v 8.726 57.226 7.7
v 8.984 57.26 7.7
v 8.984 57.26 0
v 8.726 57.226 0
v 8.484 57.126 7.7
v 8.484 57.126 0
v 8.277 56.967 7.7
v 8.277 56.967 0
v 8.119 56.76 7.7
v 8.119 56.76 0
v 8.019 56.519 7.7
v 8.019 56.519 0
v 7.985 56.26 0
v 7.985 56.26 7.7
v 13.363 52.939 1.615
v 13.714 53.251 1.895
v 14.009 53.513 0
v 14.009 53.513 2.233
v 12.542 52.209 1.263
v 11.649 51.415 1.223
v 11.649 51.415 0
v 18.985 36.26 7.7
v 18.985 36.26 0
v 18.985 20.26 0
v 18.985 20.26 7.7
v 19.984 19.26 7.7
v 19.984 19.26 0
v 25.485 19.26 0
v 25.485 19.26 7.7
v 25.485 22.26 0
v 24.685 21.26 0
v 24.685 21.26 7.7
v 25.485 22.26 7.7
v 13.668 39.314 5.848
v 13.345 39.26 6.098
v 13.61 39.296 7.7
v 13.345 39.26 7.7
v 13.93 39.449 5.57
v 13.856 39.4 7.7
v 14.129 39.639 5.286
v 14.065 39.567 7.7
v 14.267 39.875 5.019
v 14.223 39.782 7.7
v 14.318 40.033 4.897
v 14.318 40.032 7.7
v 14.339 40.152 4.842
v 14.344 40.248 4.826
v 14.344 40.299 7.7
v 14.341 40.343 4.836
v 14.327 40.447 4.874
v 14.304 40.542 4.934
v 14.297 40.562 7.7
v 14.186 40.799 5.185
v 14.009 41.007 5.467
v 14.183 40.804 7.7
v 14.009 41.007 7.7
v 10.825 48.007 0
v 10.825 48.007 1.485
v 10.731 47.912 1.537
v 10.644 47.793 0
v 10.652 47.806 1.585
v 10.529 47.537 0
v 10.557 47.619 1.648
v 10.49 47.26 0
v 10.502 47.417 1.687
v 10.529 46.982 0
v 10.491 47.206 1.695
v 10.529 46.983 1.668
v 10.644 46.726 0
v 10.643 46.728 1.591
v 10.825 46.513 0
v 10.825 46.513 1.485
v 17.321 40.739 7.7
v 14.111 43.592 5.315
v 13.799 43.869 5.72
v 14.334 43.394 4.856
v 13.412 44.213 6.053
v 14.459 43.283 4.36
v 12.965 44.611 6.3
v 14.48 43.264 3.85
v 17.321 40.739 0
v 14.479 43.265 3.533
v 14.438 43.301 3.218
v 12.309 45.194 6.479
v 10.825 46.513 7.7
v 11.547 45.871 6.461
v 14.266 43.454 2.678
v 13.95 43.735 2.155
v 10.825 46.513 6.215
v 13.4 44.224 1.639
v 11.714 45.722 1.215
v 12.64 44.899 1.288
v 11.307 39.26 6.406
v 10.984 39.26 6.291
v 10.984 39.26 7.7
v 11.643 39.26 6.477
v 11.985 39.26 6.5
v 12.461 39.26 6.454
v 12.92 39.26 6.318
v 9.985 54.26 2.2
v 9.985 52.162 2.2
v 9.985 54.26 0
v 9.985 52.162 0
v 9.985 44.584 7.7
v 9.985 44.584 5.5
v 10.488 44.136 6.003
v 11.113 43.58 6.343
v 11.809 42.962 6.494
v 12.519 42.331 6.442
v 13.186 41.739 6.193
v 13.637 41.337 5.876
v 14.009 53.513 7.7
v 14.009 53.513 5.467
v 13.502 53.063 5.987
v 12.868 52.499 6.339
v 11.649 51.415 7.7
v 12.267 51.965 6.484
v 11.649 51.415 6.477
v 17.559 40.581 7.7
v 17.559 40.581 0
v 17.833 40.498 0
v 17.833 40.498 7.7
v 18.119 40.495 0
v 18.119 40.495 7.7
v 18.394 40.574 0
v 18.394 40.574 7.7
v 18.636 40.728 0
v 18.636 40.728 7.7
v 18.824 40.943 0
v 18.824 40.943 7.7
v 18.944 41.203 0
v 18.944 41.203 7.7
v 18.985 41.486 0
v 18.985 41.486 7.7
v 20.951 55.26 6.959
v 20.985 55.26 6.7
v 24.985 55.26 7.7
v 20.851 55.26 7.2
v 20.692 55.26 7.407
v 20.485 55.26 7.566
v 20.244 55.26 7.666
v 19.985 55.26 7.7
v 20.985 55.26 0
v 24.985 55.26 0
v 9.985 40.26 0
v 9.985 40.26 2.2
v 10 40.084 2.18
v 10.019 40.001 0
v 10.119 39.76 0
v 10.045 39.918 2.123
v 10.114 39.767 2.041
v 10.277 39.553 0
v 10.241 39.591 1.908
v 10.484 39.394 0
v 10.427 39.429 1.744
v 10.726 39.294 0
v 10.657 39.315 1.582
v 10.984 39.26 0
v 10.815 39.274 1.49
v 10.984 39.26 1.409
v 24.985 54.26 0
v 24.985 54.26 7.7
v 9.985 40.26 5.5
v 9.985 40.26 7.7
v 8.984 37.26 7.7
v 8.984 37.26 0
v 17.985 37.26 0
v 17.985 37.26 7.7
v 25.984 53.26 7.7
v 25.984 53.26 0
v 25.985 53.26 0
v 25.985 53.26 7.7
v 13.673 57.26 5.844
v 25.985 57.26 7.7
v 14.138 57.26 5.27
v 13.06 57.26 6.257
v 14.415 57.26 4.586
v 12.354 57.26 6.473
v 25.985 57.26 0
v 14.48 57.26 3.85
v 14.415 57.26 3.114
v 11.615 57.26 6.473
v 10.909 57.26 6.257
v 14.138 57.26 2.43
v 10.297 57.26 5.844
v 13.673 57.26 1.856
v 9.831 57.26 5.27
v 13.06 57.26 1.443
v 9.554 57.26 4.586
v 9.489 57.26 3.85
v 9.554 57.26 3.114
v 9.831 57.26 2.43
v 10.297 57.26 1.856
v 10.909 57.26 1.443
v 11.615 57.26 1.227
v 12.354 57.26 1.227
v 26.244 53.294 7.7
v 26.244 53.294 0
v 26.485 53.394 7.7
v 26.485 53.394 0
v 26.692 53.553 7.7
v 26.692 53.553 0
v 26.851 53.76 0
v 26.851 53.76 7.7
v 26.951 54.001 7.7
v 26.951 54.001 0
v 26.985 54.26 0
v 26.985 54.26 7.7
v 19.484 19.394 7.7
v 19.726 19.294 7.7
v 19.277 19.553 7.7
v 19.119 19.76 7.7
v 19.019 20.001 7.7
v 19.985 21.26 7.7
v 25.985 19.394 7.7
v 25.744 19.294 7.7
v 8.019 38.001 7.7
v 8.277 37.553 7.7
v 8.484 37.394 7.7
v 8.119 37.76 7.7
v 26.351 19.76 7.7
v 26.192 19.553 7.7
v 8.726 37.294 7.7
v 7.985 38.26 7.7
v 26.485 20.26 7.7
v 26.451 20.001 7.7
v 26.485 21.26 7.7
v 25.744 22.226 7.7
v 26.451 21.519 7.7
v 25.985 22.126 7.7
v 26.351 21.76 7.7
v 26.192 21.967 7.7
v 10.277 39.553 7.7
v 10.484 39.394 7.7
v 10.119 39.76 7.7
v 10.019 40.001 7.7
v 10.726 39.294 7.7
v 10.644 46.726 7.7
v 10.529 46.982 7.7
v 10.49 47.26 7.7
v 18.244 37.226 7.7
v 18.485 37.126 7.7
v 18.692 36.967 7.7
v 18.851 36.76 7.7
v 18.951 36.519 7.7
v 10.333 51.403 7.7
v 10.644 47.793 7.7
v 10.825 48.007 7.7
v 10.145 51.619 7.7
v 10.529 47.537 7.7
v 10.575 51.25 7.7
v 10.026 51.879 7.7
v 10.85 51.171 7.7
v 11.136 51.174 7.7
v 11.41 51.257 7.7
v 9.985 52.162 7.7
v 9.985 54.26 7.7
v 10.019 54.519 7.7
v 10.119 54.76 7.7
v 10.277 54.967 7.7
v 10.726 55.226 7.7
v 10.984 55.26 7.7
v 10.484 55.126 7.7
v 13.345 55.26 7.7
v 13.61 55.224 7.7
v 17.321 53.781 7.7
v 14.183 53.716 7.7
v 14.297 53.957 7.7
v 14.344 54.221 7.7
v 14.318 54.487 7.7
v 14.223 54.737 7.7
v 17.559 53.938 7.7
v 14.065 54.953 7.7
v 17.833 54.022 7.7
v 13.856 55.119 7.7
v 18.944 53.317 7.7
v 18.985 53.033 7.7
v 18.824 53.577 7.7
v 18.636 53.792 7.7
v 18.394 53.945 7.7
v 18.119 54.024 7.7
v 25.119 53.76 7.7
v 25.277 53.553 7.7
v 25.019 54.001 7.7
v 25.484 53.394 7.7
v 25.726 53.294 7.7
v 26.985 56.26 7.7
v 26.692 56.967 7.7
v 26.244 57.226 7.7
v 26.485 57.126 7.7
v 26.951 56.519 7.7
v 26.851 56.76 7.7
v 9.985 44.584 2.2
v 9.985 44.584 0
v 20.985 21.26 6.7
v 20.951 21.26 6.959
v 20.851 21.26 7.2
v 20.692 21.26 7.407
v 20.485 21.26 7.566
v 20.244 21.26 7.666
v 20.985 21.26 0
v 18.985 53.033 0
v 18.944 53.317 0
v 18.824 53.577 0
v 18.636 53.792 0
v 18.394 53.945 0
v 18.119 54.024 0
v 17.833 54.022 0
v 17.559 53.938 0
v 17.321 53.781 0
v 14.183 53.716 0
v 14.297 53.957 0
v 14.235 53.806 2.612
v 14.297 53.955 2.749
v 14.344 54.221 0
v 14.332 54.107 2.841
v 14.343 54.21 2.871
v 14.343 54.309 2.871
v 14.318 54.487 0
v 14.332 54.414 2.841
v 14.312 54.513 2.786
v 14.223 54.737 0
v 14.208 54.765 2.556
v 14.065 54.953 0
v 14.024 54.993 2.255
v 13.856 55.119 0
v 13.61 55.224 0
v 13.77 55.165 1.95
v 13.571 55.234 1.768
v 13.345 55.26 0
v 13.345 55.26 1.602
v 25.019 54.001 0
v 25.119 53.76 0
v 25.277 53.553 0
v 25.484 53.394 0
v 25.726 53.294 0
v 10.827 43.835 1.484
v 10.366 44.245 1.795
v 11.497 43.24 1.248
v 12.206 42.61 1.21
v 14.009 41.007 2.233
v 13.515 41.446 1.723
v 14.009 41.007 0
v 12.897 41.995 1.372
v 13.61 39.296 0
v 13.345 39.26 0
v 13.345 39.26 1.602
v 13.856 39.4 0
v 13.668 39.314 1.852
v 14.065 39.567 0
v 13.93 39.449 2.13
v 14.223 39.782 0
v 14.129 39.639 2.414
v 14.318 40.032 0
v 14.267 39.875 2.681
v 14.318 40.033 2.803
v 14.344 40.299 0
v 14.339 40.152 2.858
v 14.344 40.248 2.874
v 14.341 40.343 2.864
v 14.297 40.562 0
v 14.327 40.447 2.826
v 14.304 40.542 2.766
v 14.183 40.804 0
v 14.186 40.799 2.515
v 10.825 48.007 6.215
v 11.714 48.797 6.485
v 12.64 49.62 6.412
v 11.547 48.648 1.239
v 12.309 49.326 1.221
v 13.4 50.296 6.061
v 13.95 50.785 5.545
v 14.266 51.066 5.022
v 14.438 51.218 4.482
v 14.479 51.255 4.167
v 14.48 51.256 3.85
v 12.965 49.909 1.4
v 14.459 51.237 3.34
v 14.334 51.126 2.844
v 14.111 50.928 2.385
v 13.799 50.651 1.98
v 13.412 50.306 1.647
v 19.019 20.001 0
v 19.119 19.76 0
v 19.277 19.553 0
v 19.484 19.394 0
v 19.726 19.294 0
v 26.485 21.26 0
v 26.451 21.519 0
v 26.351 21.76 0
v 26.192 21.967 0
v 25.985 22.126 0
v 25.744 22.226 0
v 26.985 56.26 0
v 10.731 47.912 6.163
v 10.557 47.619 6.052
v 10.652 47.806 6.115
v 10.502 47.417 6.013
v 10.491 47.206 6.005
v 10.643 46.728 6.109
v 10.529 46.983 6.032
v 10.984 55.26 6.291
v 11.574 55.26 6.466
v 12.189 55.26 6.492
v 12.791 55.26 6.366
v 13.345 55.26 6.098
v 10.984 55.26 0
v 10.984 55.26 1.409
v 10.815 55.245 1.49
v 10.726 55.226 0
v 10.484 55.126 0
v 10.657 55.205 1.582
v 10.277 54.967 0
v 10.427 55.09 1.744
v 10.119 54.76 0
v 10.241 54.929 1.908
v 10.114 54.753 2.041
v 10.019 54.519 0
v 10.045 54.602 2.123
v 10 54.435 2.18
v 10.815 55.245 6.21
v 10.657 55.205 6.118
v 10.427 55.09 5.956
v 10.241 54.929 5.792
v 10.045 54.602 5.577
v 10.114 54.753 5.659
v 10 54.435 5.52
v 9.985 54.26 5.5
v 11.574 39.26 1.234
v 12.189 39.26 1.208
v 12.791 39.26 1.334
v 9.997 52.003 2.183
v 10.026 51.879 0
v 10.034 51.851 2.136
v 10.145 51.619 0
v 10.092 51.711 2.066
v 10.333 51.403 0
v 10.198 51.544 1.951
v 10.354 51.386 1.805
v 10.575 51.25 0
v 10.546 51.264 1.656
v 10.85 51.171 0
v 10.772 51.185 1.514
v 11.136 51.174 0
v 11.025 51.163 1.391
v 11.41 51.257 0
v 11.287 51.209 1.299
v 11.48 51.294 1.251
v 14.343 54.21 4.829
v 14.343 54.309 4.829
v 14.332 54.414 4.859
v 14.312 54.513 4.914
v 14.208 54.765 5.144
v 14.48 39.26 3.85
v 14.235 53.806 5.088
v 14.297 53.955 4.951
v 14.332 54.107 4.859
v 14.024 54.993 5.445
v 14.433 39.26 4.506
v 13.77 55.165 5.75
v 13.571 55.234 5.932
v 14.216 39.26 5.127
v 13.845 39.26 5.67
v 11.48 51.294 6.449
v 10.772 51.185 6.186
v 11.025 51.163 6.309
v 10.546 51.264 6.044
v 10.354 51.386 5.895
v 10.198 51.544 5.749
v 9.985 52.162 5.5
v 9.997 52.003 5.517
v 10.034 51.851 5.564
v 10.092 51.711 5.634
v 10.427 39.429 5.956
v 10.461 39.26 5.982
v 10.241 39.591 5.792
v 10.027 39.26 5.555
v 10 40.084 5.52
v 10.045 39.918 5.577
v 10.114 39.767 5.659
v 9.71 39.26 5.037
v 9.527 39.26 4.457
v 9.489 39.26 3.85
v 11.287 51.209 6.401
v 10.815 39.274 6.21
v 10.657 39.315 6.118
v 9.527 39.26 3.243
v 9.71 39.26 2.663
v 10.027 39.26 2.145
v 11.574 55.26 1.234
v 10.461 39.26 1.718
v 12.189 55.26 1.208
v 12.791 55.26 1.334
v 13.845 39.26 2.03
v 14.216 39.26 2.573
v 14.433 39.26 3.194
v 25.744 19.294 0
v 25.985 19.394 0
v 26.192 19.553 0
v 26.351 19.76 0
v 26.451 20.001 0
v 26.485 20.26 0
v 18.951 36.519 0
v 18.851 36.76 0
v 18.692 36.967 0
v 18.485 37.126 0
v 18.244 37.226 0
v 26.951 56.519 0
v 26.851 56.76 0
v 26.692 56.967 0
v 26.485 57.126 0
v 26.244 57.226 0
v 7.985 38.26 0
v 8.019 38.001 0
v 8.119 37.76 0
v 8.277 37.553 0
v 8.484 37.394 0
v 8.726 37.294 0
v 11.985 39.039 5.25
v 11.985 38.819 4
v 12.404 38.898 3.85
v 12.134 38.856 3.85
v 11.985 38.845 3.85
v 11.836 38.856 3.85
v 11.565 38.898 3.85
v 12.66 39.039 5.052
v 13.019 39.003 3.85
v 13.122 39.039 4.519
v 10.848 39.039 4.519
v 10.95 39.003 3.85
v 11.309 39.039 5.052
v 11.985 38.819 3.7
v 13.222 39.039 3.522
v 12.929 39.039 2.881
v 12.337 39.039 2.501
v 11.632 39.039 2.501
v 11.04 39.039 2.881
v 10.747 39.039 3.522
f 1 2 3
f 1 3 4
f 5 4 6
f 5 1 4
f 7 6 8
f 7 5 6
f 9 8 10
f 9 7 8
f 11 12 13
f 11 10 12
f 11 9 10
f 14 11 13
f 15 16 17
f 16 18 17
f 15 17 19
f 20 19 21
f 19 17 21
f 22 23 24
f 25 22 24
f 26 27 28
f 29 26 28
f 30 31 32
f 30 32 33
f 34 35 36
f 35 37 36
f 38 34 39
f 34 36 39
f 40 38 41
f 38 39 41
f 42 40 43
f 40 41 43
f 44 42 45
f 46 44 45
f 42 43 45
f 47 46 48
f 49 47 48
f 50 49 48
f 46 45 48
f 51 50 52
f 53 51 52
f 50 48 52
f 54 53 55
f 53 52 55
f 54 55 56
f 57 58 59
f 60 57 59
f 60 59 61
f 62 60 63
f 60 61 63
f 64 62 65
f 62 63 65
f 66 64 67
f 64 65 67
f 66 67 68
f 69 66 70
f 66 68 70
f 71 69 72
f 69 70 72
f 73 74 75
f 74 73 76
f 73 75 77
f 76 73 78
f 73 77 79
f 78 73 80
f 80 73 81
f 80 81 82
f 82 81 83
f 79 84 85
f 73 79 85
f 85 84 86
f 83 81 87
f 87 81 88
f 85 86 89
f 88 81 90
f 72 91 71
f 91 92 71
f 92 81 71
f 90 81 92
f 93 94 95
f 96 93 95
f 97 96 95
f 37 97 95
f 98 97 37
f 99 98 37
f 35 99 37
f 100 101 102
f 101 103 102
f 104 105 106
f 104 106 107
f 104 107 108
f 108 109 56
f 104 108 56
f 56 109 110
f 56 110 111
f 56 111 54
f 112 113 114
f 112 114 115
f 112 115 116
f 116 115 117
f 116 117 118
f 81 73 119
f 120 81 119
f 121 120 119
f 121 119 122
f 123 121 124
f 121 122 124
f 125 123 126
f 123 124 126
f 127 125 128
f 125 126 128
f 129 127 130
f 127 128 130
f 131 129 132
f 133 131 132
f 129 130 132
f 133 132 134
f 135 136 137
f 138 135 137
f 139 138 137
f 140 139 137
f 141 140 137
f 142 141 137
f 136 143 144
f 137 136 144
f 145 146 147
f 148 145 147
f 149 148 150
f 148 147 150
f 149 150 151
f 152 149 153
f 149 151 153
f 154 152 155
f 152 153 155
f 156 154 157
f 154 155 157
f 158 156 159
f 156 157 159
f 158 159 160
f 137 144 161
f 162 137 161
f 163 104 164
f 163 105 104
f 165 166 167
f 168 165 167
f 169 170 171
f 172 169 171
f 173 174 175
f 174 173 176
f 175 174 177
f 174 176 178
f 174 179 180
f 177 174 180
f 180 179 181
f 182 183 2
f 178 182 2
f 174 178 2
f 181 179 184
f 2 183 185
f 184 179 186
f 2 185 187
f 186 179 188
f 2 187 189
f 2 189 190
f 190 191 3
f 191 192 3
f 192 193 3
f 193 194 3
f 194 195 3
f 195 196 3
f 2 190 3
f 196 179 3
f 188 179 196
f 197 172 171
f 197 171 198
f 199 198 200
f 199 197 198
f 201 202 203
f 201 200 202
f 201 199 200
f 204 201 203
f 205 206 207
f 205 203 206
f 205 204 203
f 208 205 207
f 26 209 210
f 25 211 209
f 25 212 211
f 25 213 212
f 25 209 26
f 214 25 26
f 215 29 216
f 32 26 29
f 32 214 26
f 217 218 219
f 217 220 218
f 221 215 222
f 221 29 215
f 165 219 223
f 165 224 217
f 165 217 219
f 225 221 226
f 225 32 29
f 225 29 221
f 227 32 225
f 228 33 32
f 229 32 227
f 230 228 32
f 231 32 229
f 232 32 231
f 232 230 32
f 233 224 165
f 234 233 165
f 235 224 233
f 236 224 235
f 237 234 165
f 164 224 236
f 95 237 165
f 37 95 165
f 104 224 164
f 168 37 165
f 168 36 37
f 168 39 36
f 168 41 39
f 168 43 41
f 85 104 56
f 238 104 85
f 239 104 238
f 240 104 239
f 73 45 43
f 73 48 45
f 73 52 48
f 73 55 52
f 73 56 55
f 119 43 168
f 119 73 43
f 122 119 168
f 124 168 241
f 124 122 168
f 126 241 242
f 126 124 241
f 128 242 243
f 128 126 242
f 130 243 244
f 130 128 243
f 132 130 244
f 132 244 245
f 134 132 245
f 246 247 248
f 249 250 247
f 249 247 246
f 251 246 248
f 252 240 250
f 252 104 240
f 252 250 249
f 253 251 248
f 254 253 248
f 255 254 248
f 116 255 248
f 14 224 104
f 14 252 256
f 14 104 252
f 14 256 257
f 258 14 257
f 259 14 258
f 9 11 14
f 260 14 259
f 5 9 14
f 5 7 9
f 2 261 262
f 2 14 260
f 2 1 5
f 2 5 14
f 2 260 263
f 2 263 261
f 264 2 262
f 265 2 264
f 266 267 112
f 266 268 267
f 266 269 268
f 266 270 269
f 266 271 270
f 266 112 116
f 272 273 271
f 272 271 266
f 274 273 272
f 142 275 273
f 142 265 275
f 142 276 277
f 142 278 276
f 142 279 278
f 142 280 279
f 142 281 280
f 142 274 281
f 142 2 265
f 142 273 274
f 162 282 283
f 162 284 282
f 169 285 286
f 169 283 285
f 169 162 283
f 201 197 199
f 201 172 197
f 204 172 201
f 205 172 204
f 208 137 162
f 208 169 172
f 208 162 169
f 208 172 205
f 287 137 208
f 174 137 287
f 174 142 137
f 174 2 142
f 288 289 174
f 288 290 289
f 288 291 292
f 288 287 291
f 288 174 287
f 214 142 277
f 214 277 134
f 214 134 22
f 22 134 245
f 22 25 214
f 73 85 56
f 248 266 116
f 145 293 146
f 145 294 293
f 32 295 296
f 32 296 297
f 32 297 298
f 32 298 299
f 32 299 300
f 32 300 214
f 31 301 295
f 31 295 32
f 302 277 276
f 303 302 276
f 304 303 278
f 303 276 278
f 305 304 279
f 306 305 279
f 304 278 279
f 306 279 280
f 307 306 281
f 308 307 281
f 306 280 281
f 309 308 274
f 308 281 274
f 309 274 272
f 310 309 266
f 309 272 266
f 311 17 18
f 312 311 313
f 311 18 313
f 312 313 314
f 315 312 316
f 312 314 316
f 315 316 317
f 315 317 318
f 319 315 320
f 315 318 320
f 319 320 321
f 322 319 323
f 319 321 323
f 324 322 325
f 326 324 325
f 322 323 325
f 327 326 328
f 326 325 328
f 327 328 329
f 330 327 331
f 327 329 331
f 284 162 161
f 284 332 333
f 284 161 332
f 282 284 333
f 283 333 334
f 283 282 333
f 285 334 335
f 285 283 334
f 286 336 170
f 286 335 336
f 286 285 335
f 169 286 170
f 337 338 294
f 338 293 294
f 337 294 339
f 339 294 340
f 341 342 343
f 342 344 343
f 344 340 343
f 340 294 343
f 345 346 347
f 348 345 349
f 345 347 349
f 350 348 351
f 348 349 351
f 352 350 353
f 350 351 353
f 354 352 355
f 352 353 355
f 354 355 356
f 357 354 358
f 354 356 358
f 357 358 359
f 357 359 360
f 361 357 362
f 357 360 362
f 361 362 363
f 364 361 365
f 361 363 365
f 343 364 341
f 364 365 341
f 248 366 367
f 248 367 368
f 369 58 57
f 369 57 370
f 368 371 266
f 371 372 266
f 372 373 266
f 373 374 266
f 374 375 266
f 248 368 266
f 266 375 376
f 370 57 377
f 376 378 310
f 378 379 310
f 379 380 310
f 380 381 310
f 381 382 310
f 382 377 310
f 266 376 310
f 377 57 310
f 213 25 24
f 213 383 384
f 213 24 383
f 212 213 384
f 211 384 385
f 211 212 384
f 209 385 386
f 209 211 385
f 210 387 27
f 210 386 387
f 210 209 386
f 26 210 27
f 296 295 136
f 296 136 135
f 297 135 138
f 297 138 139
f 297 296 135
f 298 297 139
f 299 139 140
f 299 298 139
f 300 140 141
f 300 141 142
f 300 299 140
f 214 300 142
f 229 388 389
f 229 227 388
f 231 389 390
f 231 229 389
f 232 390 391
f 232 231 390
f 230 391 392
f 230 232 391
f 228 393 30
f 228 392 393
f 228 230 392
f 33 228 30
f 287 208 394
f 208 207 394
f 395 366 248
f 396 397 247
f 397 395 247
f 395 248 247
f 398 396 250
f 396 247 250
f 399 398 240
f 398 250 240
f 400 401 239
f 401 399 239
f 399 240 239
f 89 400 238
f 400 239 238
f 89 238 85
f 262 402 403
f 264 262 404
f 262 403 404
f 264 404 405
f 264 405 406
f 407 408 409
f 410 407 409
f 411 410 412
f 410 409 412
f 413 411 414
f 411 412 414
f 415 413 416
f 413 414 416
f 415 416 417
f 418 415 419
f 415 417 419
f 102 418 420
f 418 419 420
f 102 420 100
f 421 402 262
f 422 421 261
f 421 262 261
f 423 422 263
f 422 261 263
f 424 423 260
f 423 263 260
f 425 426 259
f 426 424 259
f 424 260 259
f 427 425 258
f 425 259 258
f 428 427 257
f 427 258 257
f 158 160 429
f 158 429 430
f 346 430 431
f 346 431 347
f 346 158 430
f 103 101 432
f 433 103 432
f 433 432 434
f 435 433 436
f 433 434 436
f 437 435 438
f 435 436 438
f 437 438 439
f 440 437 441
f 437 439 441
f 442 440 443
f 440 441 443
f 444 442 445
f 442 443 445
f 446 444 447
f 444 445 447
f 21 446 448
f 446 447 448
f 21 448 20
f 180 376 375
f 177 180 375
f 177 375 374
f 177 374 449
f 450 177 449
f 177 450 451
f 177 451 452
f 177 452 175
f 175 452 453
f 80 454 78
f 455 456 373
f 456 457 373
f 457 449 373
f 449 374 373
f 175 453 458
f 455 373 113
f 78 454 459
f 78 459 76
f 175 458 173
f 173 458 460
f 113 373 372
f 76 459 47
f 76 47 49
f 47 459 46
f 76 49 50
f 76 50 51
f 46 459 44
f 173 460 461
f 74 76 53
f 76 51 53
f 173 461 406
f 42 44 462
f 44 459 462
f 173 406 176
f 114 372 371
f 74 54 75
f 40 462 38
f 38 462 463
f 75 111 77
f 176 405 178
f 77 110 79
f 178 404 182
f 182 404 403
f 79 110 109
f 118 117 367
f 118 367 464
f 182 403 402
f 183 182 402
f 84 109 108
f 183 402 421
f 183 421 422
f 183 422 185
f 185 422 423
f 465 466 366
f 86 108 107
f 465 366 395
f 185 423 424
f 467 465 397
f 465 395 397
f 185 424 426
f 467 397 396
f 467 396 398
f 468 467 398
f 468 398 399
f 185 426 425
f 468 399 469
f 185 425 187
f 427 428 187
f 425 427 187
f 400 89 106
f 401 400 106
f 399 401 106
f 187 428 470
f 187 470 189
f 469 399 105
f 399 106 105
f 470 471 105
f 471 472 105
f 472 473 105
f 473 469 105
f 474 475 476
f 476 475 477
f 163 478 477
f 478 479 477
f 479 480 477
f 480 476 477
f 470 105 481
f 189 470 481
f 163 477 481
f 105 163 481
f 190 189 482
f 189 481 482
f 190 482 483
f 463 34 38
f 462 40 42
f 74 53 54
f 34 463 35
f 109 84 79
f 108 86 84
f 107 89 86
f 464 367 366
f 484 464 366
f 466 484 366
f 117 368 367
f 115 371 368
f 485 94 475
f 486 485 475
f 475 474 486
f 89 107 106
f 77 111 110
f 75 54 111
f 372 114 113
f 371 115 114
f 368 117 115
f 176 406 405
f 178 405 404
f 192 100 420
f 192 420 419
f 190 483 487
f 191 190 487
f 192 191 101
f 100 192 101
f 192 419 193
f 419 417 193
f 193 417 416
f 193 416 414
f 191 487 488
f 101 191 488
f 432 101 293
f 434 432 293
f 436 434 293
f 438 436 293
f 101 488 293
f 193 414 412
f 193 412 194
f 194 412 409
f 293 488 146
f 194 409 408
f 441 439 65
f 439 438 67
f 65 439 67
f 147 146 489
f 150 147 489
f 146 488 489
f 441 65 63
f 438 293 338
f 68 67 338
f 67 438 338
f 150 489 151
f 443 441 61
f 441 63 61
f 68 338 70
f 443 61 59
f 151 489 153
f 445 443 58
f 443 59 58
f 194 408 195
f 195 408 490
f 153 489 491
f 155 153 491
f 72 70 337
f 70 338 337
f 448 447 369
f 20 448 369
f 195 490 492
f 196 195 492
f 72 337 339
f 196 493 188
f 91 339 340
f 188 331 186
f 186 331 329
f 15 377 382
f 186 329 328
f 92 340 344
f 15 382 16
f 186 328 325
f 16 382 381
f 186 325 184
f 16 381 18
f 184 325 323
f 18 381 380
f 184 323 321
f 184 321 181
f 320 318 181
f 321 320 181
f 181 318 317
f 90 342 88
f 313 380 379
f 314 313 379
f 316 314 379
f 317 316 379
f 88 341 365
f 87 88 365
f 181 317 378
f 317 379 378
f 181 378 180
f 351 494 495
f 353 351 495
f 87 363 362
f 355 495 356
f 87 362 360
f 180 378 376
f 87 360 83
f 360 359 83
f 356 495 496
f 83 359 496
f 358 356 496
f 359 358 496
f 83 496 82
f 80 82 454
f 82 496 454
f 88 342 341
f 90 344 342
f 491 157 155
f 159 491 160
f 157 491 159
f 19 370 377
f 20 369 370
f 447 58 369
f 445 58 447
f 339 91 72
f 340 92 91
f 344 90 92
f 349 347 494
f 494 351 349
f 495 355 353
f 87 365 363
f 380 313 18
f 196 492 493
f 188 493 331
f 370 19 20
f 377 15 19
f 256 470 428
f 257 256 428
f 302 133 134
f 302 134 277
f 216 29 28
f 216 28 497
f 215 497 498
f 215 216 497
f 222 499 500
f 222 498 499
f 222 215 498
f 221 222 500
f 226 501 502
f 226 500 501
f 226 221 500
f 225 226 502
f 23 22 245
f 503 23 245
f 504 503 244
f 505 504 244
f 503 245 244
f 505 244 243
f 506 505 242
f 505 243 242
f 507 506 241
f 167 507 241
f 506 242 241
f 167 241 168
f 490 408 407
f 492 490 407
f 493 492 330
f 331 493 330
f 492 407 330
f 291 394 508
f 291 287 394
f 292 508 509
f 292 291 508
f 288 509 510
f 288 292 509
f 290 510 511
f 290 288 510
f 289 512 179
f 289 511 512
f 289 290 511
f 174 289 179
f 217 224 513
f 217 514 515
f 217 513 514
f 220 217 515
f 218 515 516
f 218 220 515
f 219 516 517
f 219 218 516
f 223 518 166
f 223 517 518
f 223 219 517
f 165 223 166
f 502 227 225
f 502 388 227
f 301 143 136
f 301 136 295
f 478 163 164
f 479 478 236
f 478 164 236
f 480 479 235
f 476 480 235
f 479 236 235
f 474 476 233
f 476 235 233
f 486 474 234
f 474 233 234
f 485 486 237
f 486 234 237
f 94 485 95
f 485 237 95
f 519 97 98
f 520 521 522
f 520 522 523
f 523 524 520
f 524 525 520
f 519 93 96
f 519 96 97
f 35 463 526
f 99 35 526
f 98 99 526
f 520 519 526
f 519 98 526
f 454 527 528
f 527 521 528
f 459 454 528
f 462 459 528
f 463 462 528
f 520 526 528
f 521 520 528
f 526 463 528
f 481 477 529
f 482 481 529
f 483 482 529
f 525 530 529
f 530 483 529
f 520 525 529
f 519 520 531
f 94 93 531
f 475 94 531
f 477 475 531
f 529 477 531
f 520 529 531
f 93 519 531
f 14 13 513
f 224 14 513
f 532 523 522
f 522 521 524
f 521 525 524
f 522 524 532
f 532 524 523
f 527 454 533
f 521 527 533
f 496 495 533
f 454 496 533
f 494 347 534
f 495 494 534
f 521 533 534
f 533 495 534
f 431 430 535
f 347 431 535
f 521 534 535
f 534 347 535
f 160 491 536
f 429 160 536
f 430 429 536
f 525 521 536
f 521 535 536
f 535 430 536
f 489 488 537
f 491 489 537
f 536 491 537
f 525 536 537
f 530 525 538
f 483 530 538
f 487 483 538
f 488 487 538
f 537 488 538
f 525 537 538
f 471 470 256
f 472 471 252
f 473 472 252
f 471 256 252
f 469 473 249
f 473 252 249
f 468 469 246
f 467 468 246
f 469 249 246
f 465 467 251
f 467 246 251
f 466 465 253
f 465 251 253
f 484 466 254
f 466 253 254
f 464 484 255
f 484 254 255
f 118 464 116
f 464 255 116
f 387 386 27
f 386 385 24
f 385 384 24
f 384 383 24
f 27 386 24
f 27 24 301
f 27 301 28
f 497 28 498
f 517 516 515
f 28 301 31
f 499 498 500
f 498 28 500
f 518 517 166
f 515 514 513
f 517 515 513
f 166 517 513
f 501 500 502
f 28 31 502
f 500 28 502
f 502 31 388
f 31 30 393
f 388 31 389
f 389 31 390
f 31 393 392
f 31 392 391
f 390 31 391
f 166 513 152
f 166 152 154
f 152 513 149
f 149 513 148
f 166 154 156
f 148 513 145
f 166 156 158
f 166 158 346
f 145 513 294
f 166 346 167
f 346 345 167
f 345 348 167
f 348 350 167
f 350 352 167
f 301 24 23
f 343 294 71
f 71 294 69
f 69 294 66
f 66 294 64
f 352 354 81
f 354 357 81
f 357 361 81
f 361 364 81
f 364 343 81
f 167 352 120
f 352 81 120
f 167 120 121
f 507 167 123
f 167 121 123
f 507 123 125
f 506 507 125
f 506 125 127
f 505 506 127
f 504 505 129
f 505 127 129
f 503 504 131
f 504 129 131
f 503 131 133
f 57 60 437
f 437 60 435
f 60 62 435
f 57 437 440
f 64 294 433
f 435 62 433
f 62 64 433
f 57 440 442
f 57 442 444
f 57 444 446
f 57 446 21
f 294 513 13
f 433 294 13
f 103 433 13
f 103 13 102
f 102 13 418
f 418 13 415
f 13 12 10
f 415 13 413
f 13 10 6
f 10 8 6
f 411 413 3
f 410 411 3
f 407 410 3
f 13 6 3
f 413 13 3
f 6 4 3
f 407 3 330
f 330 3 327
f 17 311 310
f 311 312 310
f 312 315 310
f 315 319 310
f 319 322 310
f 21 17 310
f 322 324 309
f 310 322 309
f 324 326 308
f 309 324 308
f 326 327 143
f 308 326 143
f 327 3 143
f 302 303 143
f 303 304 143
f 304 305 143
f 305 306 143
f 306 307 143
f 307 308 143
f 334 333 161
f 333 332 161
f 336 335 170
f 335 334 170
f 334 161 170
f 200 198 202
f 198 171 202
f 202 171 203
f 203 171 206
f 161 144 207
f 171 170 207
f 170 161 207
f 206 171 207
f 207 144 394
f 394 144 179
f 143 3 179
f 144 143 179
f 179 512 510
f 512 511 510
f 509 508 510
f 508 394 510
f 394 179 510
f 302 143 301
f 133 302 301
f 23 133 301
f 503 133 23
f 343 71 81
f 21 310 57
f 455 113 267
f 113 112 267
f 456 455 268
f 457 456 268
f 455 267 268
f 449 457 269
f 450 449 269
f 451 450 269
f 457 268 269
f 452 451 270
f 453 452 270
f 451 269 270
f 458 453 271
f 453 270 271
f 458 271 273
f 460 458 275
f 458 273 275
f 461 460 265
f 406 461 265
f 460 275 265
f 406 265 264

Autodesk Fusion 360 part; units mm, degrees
sketch "Sketch1" plane through (0, 0, 0) normal (0, 0, 1) x (1, 0, 0)
  line L0 (20.9846, 55.2598) -> (20.9846, 21.2598)
  line L1 (20.9846, 55.2598) -> (24.9846, 55.2598)
  line L2 (24.9846, 55.2598) -> (24.9846, 53.2598)
  line L3 (24.9846, 53.2598) -> (26.9846, 53.2598)
  line L4 (26.9846, 53.2598) -> (26.9846, 57.2598)
  line L5 (26.9846, 57.2598) -> (7.9846, 57.2598)
  line L6 (7.9846, 57.2598) -> (7.9846, 37.2598)
  line L7 (7.9846, 37.2598) -> (18.9846, 37.2598)
  line L8 (18.9846, 37.2598) -> (18.9846, 19.2598)
  line L9 (18.9846, 19.2598) -> (26.485, 19.2598)
  line L10 (20.9846, 21.2598) -> (24.6846, 21.2598)
  line L11 (24.6846, 21.2598) -> (25.485, 22.2598)
  line L12 (25.485, 22.2598) -> (26.485, 22.2598)
  line L13 (26.485, 22.2598) -> (26.485, 19.2598)
  line L14 (9.9846, 55.2598) -> (15.9742, 55.2598)
  line L15 (15.9742, 55.2598) -> (9.9846, 49.9357)
  line L16 (9.9846, 49.9357) -> (9.9846, 55.2598)
  line L17 (9.9846, 44.5839) -> (9.9846, 39.2598)
  line L18 (9.9846, 39.2598) -> (15.9742, 39.2598)
  line L19 (9.9846, 44.5839) -> (15.9742, 39.2598)
  line L20 (9.9846, 47.2598) -> (18.9846, 55.2598)
  line L21 (18.9846, 39.2598) -> (9.9846, 47.2598)
  line L22 (18.9846, 39.2598) -> (18.9846, 55.2598)
  dimension "d1" = 2
  dimension "d2" = 4
  dimension "d3" = 2
  dimension "d4" = 2
  dimension "d5" = 13
  dimension "d6" = 34
  dimension "d7" = 1
  dimension "d8" = 3.7
  dimension "d9" = 1
  dimension "d10" = 2
  dimension "d11" = 20
  dimension "d15" = 2
  dimension "d25" = 2
  dimension "d26" = 2
  dimension "d27" = 2
  dimension "d29" = 2
  dimension "d30" = 2
  dimension "d31" = 2
  dimension "d32" = 2
  dimension "d34" = 2
  dimension "d35" = 2
extrude "Extrude1" add sketch "Sketch1" along normal blind 7.7
fillet "Fillet1" radius 1 9 edges at (7.9846, 37.2598, 3.85) (18.9846, 37.2598, 3.85) (18.9846, 19.2598, 3.85) (26.485, 19.2598, 3.85) (7.9846, 57.2598, 3.85) (26.485, 22.2598, 3.85) (24.9846, 53.2598, 3.85) (26.9846, 53.2598, 3.85) (26.9846, 57.2598, 3.85)
fillet "Fillet1" radius 1 9 edges at (9.9846, 55.2598, 3.85) (15.9742, 55.2598, 3.85) (15.9742, 39.2598, 3.85) (9.9846, 39.2598, 3.85) (20.9846, 38.2598, 7.7) (9.9846, 49.9357, 3.85) (9.9846, 47.2598, 3.85) (18.9846, 55.2598, 3.85) (18.9846, 39.2598, 3.85)
sketch "Sketch2" plane through (0, 57.2598, 0) normal (0, 1, 0) x (-1, 0, 0)
  line L0 (-25.9846, 7.7) -> (-25.9846, 0)
  line L1 (-25.9846, 0) -> (-8.9846, 0)
  line L2 (-8.9846, 0) -> (-8.9846, 7.7)
  line L3 (-8.9846, 7.7) -> (-25.9846, 7.7)
  line L4 (-26.9846, 7.7) -> (-26.9846, 0)
  line L5 (-7.9846, 0) -> (-7.9846, 7.7)
  line L6 (-20.9846, 0) -> (-20.9846, 6.7)
  point P0 (-11.9846, 4)
  point P1 (-20.9846, 0)
  point P2 (-11.9846, 3.7)
  dimension "d16" = 4
  dimension "d22" = 9
  dimension "d23" = 9
  dimension "d24" = 4
hole "Hole1" at (11.9846, 57.2598, 4) at (11.9846, 57.2598, 3.7) direction (0, -1, 0) diameter 5 depth 18 tip angle 160
